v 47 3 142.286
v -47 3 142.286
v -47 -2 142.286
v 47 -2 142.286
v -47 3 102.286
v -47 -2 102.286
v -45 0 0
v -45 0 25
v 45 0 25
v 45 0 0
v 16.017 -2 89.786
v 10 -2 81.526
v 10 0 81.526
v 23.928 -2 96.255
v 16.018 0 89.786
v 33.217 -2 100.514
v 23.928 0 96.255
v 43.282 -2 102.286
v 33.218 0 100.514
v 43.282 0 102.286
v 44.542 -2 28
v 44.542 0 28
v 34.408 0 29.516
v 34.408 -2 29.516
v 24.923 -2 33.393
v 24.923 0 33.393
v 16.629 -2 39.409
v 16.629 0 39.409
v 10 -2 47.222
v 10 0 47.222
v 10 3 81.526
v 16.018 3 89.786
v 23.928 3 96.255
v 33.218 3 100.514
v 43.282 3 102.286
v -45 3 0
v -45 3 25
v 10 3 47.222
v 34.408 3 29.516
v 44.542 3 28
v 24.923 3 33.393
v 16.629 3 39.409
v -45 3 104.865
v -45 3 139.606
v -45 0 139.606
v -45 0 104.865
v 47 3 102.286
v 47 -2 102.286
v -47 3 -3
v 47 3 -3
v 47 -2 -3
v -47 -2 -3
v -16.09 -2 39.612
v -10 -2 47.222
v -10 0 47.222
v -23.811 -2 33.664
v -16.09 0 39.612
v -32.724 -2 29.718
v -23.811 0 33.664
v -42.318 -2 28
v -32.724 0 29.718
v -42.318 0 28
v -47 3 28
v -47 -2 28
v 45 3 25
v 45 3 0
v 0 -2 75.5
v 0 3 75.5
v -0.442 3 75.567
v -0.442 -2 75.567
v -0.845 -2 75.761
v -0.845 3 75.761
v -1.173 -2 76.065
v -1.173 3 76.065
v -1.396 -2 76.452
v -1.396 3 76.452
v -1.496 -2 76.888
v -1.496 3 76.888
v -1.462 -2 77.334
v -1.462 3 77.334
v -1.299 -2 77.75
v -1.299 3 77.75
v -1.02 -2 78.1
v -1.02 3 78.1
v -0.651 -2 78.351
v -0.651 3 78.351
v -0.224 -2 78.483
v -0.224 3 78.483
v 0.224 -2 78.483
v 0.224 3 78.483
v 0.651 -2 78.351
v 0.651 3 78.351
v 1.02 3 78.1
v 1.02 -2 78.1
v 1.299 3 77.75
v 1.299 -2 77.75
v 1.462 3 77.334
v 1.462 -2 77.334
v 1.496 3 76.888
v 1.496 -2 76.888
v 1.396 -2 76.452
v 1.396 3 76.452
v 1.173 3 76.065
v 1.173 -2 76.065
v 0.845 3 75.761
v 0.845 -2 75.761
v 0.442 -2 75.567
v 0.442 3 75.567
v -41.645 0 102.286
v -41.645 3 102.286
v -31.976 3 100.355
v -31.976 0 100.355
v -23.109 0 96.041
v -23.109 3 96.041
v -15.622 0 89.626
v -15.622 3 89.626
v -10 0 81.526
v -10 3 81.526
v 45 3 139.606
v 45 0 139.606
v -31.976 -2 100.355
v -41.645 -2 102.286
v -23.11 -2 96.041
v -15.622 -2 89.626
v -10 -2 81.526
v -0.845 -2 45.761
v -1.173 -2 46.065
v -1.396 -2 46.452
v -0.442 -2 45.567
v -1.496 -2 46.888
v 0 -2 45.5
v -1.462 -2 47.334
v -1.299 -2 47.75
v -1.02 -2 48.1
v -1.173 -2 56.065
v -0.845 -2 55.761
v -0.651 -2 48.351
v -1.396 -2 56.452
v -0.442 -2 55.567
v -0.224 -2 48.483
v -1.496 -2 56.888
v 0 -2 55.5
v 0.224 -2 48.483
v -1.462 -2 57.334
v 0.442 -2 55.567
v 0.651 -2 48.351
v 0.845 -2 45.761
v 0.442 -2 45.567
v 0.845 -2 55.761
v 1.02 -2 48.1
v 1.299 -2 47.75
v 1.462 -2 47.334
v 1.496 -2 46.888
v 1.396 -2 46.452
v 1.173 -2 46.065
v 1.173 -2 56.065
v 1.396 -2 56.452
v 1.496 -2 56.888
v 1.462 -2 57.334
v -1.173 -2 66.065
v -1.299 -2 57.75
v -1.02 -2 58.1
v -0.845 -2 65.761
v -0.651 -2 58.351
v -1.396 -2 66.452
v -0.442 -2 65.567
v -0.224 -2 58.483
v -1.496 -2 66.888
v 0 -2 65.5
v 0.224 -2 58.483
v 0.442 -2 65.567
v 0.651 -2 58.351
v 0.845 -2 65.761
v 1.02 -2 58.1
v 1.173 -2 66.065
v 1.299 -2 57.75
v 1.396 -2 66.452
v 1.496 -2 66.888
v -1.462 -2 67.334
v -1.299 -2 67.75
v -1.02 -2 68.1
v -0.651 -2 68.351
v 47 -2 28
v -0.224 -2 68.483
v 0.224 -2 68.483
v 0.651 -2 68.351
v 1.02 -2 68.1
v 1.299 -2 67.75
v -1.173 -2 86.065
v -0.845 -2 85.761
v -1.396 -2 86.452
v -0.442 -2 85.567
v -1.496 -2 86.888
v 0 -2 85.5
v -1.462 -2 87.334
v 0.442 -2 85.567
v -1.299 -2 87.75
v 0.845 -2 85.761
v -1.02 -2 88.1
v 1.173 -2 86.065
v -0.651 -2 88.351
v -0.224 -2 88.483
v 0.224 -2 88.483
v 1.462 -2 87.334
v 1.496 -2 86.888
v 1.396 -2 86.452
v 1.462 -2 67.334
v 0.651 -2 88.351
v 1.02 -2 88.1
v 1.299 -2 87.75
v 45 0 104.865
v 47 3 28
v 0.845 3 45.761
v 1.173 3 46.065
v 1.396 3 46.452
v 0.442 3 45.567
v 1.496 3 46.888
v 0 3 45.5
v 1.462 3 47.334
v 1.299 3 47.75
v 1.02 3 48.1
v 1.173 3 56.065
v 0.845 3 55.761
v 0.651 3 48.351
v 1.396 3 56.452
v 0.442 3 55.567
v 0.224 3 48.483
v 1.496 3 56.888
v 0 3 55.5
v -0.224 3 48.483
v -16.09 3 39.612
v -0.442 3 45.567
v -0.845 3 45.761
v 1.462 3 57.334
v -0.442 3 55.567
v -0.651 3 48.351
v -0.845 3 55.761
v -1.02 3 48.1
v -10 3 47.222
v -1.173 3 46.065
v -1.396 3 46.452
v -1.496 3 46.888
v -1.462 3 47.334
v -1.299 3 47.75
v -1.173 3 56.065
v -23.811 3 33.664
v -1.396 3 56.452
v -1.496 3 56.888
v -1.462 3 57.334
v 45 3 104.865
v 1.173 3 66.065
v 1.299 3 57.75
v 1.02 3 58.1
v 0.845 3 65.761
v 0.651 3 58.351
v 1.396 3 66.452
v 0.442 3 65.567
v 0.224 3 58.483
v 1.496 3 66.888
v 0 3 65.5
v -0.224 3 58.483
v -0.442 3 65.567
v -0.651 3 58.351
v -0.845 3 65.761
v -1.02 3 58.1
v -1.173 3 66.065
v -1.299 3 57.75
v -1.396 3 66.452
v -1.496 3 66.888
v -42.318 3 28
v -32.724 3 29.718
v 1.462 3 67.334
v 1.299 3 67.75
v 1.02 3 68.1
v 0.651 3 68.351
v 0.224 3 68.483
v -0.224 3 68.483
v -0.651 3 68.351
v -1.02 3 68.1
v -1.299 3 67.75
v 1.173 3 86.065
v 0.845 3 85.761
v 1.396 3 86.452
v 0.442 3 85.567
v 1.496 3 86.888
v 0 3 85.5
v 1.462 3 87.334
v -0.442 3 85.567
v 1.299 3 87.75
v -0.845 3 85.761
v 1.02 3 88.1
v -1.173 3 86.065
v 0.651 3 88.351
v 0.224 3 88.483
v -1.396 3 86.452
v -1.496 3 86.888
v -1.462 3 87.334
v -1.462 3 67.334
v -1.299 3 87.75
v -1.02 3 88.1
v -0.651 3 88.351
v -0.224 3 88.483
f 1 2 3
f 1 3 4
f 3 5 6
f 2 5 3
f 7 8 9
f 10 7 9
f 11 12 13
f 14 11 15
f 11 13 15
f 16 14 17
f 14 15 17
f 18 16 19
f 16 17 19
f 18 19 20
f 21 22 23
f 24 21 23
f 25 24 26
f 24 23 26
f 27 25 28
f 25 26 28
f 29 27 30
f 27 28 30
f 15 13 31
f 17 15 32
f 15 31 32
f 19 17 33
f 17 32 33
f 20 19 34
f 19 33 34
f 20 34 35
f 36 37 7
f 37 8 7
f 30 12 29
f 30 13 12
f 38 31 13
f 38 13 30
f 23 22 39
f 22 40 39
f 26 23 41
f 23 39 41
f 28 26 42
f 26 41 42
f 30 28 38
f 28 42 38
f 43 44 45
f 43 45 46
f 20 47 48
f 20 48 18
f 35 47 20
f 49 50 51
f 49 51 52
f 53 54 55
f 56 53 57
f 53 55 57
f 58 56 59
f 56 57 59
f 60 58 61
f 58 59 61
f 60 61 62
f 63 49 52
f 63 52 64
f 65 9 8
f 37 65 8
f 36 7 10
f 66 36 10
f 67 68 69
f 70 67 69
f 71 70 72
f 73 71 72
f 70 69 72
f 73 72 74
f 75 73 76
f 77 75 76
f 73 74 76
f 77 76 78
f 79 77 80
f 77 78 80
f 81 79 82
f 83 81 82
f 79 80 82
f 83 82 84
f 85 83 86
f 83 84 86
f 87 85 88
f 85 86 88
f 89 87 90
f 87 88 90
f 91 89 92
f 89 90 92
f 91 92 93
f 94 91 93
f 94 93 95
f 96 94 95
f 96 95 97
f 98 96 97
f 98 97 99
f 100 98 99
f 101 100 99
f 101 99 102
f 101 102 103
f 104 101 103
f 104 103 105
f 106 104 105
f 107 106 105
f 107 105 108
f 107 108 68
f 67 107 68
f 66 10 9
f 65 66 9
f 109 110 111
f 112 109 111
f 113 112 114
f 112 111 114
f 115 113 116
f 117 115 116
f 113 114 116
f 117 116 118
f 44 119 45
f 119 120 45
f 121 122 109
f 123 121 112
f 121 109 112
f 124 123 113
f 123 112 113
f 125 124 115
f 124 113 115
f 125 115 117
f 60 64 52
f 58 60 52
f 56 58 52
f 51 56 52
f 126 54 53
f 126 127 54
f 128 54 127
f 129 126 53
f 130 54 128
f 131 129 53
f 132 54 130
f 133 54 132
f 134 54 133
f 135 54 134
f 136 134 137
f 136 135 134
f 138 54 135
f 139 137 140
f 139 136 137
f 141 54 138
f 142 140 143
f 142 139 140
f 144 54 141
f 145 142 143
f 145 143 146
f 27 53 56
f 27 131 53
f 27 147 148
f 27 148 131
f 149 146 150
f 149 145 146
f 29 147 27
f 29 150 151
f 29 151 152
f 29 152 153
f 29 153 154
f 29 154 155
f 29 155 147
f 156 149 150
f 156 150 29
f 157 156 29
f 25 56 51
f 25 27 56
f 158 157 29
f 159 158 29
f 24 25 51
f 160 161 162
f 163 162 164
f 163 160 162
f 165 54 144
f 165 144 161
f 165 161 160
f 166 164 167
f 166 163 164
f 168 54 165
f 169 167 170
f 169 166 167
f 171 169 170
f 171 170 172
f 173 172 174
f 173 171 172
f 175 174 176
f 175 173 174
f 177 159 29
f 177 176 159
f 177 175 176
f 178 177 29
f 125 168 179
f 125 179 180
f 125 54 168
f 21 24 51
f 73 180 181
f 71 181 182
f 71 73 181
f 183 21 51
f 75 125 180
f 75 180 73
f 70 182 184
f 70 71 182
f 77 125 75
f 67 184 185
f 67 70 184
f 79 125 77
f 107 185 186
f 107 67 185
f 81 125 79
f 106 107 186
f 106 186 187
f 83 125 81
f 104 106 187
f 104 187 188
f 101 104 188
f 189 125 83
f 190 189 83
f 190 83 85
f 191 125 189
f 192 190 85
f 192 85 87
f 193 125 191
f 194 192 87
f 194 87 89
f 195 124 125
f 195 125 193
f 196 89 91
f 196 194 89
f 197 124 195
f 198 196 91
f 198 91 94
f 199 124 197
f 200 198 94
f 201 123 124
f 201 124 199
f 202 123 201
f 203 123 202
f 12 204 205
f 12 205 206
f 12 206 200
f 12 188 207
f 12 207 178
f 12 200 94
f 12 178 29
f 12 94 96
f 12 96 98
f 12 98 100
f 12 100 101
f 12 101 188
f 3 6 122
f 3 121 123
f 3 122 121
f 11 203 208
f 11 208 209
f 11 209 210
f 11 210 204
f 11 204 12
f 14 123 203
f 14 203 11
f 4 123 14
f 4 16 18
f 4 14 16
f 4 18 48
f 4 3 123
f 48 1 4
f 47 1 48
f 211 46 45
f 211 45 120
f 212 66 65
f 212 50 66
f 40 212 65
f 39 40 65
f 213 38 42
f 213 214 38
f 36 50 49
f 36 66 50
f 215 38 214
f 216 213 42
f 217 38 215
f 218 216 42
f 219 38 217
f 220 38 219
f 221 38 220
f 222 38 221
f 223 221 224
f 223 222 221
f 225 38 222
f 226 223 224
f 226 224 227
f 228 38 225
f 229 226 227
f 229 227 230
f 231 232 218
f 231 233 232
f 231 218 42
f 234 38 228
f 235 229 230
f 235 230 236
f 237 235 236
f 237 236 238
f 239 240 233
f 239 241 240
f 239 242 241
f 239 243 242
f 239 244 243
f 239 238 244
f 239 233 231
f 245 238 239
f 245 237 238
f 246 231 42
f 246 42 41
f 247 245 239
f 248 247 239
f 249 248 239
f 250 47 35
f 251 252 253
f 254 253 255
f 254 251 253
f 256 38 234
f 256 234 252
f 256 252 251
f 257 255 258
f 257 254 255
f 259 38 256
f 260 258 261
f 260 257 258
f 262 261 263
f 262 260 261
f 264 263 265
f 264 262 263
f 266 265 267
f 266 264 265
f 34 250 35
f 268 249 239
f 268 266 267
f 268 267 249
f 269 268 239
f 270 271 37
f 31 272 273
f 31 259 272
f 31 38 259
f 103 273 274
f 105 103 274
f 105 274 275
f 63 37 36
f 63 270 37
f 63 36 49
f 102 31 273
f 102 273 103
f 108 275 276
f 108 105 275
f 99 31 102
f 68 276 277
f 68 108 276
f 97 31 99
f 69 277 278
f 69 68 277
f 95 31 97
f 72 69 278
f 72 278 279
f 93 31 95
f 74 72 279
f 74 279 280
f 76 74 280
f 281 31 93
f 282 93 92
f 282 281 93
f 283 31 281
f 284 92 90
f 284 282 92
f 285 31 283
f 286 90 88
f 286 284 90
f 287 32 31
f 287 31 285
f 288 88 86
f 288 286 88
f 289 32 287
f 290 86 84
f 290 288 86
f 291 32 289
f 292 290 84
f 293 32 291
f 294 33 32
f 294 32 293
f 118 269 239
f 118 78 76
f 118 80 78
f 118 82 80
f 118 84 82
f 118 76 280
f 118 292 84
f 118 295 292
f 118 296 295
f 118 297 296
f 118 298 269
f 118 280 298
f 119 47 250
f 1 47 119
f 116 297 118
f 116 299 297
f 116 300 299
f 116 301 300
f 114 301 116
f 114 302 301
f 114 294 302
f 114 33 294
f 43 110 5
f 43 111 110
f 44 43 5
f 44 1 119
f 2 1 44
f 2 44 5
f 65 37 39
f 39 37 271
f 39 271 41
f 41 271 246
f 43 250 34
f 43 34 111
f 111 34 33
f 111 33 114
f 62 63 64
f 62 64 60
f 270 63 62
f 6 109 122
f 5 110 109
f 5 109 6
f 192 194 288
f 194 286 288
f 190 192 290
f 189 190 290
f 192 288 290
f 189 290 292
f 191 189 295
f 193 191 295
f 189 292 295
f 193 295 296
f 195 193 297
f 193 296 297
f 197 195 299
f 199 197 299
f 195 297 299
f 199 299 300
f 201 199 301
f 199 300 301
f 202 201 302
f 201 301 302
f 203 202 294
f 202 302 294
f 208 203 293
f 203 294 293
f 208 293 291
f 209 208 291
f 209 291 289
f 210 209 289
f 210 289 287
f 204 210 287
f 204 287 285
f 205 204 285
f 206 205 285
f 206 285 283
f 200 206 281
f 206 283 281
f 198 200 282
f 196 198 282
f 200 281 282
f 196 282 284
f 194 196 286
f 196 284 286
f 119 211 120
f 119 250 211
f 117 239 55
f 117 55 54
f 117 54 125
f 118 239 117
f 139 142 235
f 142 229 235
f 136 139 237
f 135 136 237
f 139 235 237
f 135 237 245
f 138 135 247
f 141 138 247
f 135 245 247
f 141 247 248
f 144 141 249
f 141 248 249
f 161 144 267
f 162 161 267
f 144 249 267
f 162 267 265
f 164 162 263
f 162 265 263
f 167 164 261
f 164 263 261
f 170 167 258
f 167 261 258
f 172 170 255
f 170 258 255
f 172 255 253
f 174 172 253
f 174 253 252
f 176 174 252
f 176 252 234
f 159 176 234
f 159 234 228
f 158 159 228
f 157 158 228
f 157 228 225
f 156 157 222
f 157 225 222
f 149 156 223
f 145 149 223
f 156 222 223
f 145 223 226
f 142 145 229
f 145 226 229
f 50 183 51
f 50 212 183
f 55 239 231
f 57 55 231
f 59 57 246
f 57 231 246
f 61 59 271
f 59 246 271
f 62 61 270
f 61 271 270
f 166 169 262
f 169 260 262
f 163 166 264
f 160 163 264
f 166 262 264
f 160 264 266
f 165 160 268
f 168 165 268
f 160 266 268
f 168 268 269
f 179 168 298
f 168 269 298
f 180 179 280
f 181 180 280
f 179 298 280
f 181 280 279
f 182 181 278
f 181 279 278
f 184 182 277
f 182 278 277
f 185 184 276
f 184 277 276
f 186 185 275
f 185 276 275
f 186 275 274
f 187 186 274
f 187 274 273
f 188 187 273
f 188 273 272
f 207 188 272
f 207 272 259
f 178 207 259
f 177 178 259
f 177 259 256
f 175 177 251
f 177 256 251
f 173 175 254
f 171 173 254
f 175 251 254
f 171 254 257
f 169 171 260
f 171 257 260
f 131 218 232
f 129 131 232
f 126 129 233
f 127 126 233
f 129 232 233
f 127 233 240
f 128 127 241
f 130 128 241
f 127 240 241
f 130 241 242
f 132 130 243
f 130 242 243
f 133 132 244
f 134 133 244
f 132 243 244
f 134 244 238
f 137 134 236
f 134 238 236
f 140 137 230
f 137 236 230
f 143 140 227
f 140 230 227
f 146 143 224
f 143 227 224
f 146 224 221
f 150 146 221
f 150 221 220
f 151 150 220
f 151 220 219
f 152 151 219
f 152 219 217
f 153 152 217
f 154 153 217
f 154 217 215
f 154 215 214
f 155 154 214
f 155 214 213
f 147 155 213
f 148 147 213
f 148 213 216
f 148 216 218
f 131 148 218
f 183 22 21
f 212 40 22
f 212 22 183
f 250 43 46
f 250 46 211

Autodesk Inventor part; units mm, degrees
ref_plane "YZ Plane" through (0, 0, 0) normal (1, 0, 0) x (0, 1, 0)
ref_plane "XZ Plane" through (0, 0, 0) normal (0, 1, 0) x (-1, 0, 0)
ref_plane "XY Plane" through (0, 0, 0) normal (0, 0, 1) x (1, 0, 0)
sketch "スケッチ1" plane through (0, 0, 0) normal (0, 1, 0) x (-1, 0, 0)
  line L0 (0, 0) -> (0, 25)
  line L1 (0, 25) -> (0, 104.965)
  line L2 (0, 104.965) -> (0, 139.606)
  line L3 (-45, 25) -> (45, 25)
  line L4 (45, 25) -> (45, 0)
  line L5 (45, 0) -> (-45, 0)
  line L6 (-45, 0) -> (-45, 25)
  line L7 (-45, 25) -> (45, 0) construction
  line L8 (45, 25) -> (-45, 0) construction
  line L9 (-47, 28) -> (47, 28)
  line L10 (47, 28) -> (47, -3)
  line L11 (47, -3) -> (-47, -3)
  line L12 (-47, -3) -> (-47, 28)
  line L13 (-47, 28) -> (47, -3) construction
  line L14 (47, 28) -> (-47, -3) construction
  line L15 (-47, 142.2855) -> (47, 142.2855)
  line L16 (47, 142.2855) -> (47, 102.2855)
  line L17 (47, 102.2855) -> (-47, 102.2855)
  line L18 (-47, 102.2855) -> (-47, 142.2855)
  line L19 (-47, 142.2855) -> (47, 102.2855) construction
  line L20 (47, 142.2855) -> (-47, 102.2855) construction
  line L21 (-45, 139.606) -> (45, 139.606)
  line L22 (45, 139.606) -> (45, 104.965)
  line L23 (45, 104.965) -> (-45, 104.965)
  line L24 (-45, 104.965) -> (-45, 139.606)
  line L25 (-45, 139.606) -> (45, 104.965) construction
  line L26 (45, 139.606) -> (-45, 104.965) construction
  line L27 (-10, 28) -> (10, 28)
  line L28 (10, 28) -> (10, 102.2855)
  line L29 (10, 102.2855) -> (-10, 102.2855)
  line L30 (-10, 102.2855) -> (-10, 28)
  arc A0 (-10, 84.5837) -> (-47, 102.2855) centre (-46.0082, 56.8392) ccw
  arc A1 (-47, 28) -> (-10, 49.4601) centre (-44.5907, 66.4724) ccw
  arc A2 (47, 102.2855) -> (10, 84.5837) centre (46.0082, 56.8392) ccw
  arc A3 (10, 49.4601) -> (47, 28) centre (44.5907, 66.4724) ccw
  point P0 (0, 12.5)
  point P1 (0, 12.5)
  point P2 (0, 122.2855)
  point P3 (0, 122.2855)
  dimension "d0" = 25
  dimension "d1" = 79.965
  dimension "d2" = 34.641
  dimension "d3" = 90
  dimension "d4" = 94
  dimension "d5" = 31
  dimension "d6" = 94
  dimension "d7" = 40
  dimension "d8" = 90
  dimension "d9" = 20
  dimension "d10" = 10
extrude "押し出し1" add sketch "スケッチ1" along normal blind 3 contours L9 L30 L17 L1 | L9 A3 L10 L11 L12 A1 | L1 L17 L28 L9 | L17 A0 L18 L15 L16 A2 | A1 L9 | L9 A3 | A2 L17 | L17 A0
sketch "スケッチ2" plane through (0, 3, 0) normal (0, 1, 0) x (1, 0, 0)
  line L0 (-45, -139.606) -> (-45, -104.965) projected
  line L1 (-45, -104.965) -> (45, -104.965) projected
  line L2 (45, -104.965) -> (45, -139.606) projected
  line L3 (45, -139.606) -> (-45, -139.606) projected
  line L4 (-45, -25) -> (-45, 0) projected
  line L5 (-45, 0) -> (45, 0) projected
  line L6 (45, 0) -> (45, -25) projected
  line L7 (45, -25) -> (-45, -25) projected
  line L8 (-10, -28) -> (-10, -102.2855) projected
  line L9 (-10, -102.2855) -> (-47, -102.2855) projected
  line L10 (-47, -102.2855) -> (-47, -142.2855) projected
  line L11 (-47, -142.2855) -> (47, -142.2855) projected
  line L12 (47, -142.2855) -> (47, -102.2855) projected
  line L13 (47, -102.2855) -> (10, -102.2855) projected
  line L14 (10, -102.2855) -> (10, -28) projected
  line L15 (10, -28) -> (47, -28) projected
  line L16 (47, -28) -> (47, 3) projected
  line L17 (47, 3) -> (-47, 3) projected
  line L18 (-47, 3) -> (-47, -28) projected
  line L19 (-47, -28) -> (-10, -28) projected
  arc A0 (-10, -47.2222) -> (-47, -28) centre (-44.6937, -68.7817) ccw
  arc A1 (-47, -102.2855) -> (-10, -81.2921) centre (-44.5262, -63.5433) ccw
  line L20 (0, -57.408) -> (0, -62.3253)
  arc A2 (47, -28) -> (10, -47.2222) centre (44.6937, -68.7817) ccw
  arc A3 (10, -81.2921) -> (47, -102.2855) centre (44.5262, -63.5433) ccw
  arc A4 (-10, -47.2222) -> (-47, -28) centre (-44.6937, -68.7817) ccw
  arc A5 (-47, -102.2855) -> (-10, -81.2921) centre (-44.5262, -63.5433) ccw
  arc A6 (47, -28) -> (10, -47.2222) centre (44.6937, -68.7817) ccw
  arc A7 (10, -81.2921) -> (47, -102.2855) centre (44.5262, -63.5433) ccw
  point P0 (0, 0)
sketch "スケッチ3" plane through (0, 3, 0) normal (0, 1, 0) x (1, 0, 0)
  line L0 (-45, -139.606) -> (-45, -104.965) projected
  line L1 (-45, -104.965) -> (45, -104.965) projected
  line L2 (45, -104.965) -> (45, -139.606) projected
  line L3 (45, -139.606) -> (-45, -139.606) projected
  line L4 (-45, -25) -> (-45, 0) projected
  line L5 (-45, 0) -> (45, 0) projected
  line L6 (45, 0) -> (45, -25) projected
  line L7 (45, -25) -> (-45, -25) projected
  line L8 (-10, -28) -> (-10, -102.2855) projected
  line L9 (-10, -102.2855) -> (-47, -102.2855) projected
  line L10 (-47, -102.2855) -> (-47, -142.2855) projected
  line L11 (-47, -142.2855) -> (47, -142.2855) projected
  line L12 (47, -142.2855) -> (47, -102.2855) projected
  line L13 (47, -102.2855) -> (10, -102.2855) projected
  line L14 (10, -102.2855) -> (10, -28) projected
  line L15 (10, -28) -> (47, -28) projected
  line L16 (47, -28) -> (47, 3) projected
  line L17 (47, 3) -> (-47, 3) projected
  line L18 (-47, 3) -> (-47, -28) projected
  line L19 (-47, -28) -> (-10, -28) projected
  arc A0 (-10, -47.2222) -> (-47, -28) centre (-44.6589, -68.7147) ccw
  arc A1 (47, -28) -> (10, -47.2222) centre (45.0843, -69.5335) ccw
  arc A2 (10, -81.5262) -> (47, -102.2855) centre (44.8559, -62.7542) ccw
  arc A3 (-47, -102.2855) -> (-10, -81.5262) centre (-44.3224, -63.705) ccw
  point P0 (0, 0)
extrude "押し出し3" add sketch "スケッチ3" against normal blind 3 contours L19 A0 L18 L17 L16 A1 L15 L14 L13 A2 L12 L11 L10 A3 L9 L8 | L8 A0 L19 | L19 A0 | L8 L9 A3 | A3 L9 | L15 A1 | A2 L13
sketch "スケッチ4" plane through (0, 3, 0) normal (0, 1, 0) x (1, 0, 0)
  line L0 (-45, -139.606) -> (-45, -104.965) projected
  line L1 (-45, -104.965) -> (45, -104.965) projected
  line L2 (45, -104.965) -> (45, -139.606) projected
  line L3 (45, -139.606) -> (-45, -139.606) projected
  line L4 (-45, -25) -> (-45, 0) projected
  line L5 (-45, 0) -> (45, 0) projected
  line L6 (45, 0) -> (45, -25) projected
  line L7 (45, -25) -> (-45, -25) projected
  line L8 (-10, -47.2222) -> (-10, -81.5262) projected
  arc A0 (-41.6448, -102.2855) -> (-10, -81.5262) centre (-44.3224, -63.705) ccw projected
  line L9 (-41.6448, -102.2855) -> (-47, -102.2855) projected
  line L10 (-47, -102.2855) -> (-47, -142.2855) projected
  line L11 (-47, -142.2855) -> (47, -142.2855) projected
  line L12 (47, -142.2855) -> (47, -102.2855) projected
  line L13 (47, -102.2855) -> (10, -102.2855) projected
  line L14 (10, -102.2855) -> (10, -28) projected
  line L15 (10, -28) -> (47, -28) projected
  line L16 (47, -28) -> (47, 3) projected
  line L17 (47, 3) -> (-47, 3) projected
  line L18 (-47, 3) -> (-47, -28) projected
  line L19 (-47, -28) -> (-42.3178, -28) projected
  arc A1 (-10, -47.2222) -> (-42.3178, -28) centre (-44.6589, -68.7147) ccw projected
  arc A2 (47, -28) -> (10, -47.2222) centre (45.7708, -70.8549) ccw
  arc A3 (10, -81.5262) -> (47, -102.2855) centre (45.1409, -62.2461) ccw
  point P0 (0, 0)
extrude "押し出し4" add sketch "スケッチ4" against normal blind 3
sketch "スケッチ5" plane through (0, 0, 0) normal (0, -1, 0) x (1, 0, 0)
  arc A0 (43.2819, 102.2855) -> (10, 81.5262) centre (45.1409, 62.2461) ccw projected
  line L0 (47, 102.2855) -> (43.2819, 102.2855) projected
  line L1 (47, 142.2855) -> (47, 102.2855) projected
  line L2 (-47, 142.2855) -> (47, 142.2855) projected
  line L3 (-47, 102.2855) -> (-47, 142.2855) projected
  line L4 (-41.6448, 102.2855) -> (-47, 102.2855) projected
  arc A1 (-10, 81.5262) -> (-41.6448, 102.2855) centre (-44.3224, 63.705) ccw projected
  line L5 (-10, 47.2222) -> (-10, 81.5262) projected
  arc A2 (-42.3178, 28) -> (-10, 47.2222) centre (-44.6589, 68.7147) ccw projected
  line L6 (-47, 28) -> (-42.3178, 28) projected
  line L7 (-47, -3) -> (-47, 28) projected
  line L8 (47, -3) -> (-47, -3) projected
  line L9 (47, 28) -> (47, -3) projected
  line L10 (44.5416, 28) -> (47, 28) projected
  arc A3 (10, 47.2222) -> (44.5416, 28) centre (45.7708, 70.8549) ccw projected
  line L11 (10, 81.5262) -> (10, 47.2222) projected
  point P0 (0, 0)
extrude "押し出し5" add sketch "スケッチ5" along normal blind 2
sketch "スケッチ6" plane through (0, 3, 0) normal (0, 1, 0) x (1, 0, 0)
  line L0 (45, -104.965) -> (-45, -104.965)
  line L1 (-45, -104.965) -> (-45, -104.865)
  line L2 (-45, -104.865) -> (45, -104.865)
  line L3 (45, -104.865) -> (45, -104.965)
  point P0 (0, 0)
  dimension "d21" = 0.1
extrude "押し出し6" cut sketch "スケッチ6" against normal blind 3
sketch "スケッチ7" plane through (-10, 3, 47.2222) normal (-1, 0, 0) x (0, 0, 1)
  line L0 (34.3041, -5) -> (0, -5) projected
  line L1 (57.6402, 0) -> (44.0812, 0)
  line L2 (44.0812, 0) -> (54.2504, 5.8712)
  line L3 (57.6402, 0) -> (54.2504, 5.8712)
  point P0 (-47.2222, -3)
  dimension "d24" = 30
extrude "押し出し7" add sketch "スケッチ7" against normal blind 20
sketch "スケッチ8" plane through (-10, 3, 47.2222) normal (-1, 0, 0) x (0, 0, 1)
  line L0 (57.6402, 0) -> (44.0812, 0) projected
  line L1 (54.2504, 5.8712) -> (57.6402, 0) projected
  line L2 (44.0812, 0) -> (54.2504, 5.8712) projected
  line L3 (57.6402, 0) -> (48.1987, 16.3532)
  line L4 (44.0812, 13.9759) -> (44.0812, 0)
  line L5 (44.0812, 13.9759) -> (48.1987, 16.3532)
  point P0 (-47.2222, -3)
  dimension "d27" = 18.883
extrude "押し出し8" add sketch "スケッチ8" against normal blind 20 contours L4 L5 L3 L2
sketch "スケッチ9" plane through (-10, 3, 47.2222) normal (-1, 0, 0) x (0, 0, 1)
  line L0 (48.1987, 16.3532) -> (44.0812, 13.9759) projected
  line L1 (44.0812, 13.9759) -> (44.0812, 0) projected
  line L2 (48.1987, 16.3532) -> (47.6747, 17.2608)
  line L3 (47.6747, 17.2608) -> (43.5572, 14.8835)
  line L4 (43.5572, 14.8835) -> (44.0812, 13.9759)
  line L5 (44.0812, 13.9759) -> (48.1987, 16.3532)
  line L6 (44.0812, 13.9759) -> (44.0812, 15.1861)
  point P0 (-47.2222, -3)
  dimension "d30" = 1.048
extrude "押し出し9" add sketch "スケッチ9" against normal blind 20 contours L0 L6 L3 L2
sketch "スケッチ10" plane through (-10, 3, 47.2222) normal (-1, 0, 0) x (0, 0, 1)
  line L0 (57.6402, 0) -> (44.0812, 0) projected
  line L1 (57.6402, 0) -> (47.6747, 17.2608) projected
  line L2 (47.6747, 17.2608) -> (44.0812, 15.1861) projected
  line L3 (44.0812, 15.1861) -> (44.0812, 0) projected
  point P0 (-47.2222, -3)
extrude "押し出し10" cut sketch "スケッチ10" against normal blind 20
sketch "スケッチ11" plane through (0, -2, 0) normal (0, -1, 0) x (1, 0, 0)
  line L0 (-47, -3) -> (47, -3) projected
  line L1 (10, 47.2222) -> (10, 81.5262) projected
  line L2 (0, -3) -> (0, 47)
  line L3 (0, 47) -> (0, 57)
  line L4 (0, 57) -> (0, 67)
  line L5 (0, 67) -> (0, 77)
  line L6 (0, 77) -> (0, 87)
  circle A0 centre (0, 47) radius 1.5
  circle A1 centre (0, 57) radius 1.5
  circle A2 centre (0, 67) radius 1.5
  circle A3 centre (0, 77) radius 1.5
  circle A4 centre (0, 87) radius 1.5
  point P0 (0, 0)
  dimension "d35" = 50
  dimension "d36" = 10
  dimension "d37" = 10
  dimension "d38" = 10
  dimension "d39" = 10
  dimension "d40" = 3
  dimension "d41" = 3
  dimension "d42" = 3
  dimension "d43" = 3
  dimension "d44" = 3
hole "穴1" at (0, -2, 87) at (0, -2, 77) at (0, -2, 67) at (0, -2, 57) at (0, -2, 47) direction (0, 1, 0) diameter 3 depth 8 tip angle 118
properties part number "知能ロボコン台座" material "ABS プラスチック"
